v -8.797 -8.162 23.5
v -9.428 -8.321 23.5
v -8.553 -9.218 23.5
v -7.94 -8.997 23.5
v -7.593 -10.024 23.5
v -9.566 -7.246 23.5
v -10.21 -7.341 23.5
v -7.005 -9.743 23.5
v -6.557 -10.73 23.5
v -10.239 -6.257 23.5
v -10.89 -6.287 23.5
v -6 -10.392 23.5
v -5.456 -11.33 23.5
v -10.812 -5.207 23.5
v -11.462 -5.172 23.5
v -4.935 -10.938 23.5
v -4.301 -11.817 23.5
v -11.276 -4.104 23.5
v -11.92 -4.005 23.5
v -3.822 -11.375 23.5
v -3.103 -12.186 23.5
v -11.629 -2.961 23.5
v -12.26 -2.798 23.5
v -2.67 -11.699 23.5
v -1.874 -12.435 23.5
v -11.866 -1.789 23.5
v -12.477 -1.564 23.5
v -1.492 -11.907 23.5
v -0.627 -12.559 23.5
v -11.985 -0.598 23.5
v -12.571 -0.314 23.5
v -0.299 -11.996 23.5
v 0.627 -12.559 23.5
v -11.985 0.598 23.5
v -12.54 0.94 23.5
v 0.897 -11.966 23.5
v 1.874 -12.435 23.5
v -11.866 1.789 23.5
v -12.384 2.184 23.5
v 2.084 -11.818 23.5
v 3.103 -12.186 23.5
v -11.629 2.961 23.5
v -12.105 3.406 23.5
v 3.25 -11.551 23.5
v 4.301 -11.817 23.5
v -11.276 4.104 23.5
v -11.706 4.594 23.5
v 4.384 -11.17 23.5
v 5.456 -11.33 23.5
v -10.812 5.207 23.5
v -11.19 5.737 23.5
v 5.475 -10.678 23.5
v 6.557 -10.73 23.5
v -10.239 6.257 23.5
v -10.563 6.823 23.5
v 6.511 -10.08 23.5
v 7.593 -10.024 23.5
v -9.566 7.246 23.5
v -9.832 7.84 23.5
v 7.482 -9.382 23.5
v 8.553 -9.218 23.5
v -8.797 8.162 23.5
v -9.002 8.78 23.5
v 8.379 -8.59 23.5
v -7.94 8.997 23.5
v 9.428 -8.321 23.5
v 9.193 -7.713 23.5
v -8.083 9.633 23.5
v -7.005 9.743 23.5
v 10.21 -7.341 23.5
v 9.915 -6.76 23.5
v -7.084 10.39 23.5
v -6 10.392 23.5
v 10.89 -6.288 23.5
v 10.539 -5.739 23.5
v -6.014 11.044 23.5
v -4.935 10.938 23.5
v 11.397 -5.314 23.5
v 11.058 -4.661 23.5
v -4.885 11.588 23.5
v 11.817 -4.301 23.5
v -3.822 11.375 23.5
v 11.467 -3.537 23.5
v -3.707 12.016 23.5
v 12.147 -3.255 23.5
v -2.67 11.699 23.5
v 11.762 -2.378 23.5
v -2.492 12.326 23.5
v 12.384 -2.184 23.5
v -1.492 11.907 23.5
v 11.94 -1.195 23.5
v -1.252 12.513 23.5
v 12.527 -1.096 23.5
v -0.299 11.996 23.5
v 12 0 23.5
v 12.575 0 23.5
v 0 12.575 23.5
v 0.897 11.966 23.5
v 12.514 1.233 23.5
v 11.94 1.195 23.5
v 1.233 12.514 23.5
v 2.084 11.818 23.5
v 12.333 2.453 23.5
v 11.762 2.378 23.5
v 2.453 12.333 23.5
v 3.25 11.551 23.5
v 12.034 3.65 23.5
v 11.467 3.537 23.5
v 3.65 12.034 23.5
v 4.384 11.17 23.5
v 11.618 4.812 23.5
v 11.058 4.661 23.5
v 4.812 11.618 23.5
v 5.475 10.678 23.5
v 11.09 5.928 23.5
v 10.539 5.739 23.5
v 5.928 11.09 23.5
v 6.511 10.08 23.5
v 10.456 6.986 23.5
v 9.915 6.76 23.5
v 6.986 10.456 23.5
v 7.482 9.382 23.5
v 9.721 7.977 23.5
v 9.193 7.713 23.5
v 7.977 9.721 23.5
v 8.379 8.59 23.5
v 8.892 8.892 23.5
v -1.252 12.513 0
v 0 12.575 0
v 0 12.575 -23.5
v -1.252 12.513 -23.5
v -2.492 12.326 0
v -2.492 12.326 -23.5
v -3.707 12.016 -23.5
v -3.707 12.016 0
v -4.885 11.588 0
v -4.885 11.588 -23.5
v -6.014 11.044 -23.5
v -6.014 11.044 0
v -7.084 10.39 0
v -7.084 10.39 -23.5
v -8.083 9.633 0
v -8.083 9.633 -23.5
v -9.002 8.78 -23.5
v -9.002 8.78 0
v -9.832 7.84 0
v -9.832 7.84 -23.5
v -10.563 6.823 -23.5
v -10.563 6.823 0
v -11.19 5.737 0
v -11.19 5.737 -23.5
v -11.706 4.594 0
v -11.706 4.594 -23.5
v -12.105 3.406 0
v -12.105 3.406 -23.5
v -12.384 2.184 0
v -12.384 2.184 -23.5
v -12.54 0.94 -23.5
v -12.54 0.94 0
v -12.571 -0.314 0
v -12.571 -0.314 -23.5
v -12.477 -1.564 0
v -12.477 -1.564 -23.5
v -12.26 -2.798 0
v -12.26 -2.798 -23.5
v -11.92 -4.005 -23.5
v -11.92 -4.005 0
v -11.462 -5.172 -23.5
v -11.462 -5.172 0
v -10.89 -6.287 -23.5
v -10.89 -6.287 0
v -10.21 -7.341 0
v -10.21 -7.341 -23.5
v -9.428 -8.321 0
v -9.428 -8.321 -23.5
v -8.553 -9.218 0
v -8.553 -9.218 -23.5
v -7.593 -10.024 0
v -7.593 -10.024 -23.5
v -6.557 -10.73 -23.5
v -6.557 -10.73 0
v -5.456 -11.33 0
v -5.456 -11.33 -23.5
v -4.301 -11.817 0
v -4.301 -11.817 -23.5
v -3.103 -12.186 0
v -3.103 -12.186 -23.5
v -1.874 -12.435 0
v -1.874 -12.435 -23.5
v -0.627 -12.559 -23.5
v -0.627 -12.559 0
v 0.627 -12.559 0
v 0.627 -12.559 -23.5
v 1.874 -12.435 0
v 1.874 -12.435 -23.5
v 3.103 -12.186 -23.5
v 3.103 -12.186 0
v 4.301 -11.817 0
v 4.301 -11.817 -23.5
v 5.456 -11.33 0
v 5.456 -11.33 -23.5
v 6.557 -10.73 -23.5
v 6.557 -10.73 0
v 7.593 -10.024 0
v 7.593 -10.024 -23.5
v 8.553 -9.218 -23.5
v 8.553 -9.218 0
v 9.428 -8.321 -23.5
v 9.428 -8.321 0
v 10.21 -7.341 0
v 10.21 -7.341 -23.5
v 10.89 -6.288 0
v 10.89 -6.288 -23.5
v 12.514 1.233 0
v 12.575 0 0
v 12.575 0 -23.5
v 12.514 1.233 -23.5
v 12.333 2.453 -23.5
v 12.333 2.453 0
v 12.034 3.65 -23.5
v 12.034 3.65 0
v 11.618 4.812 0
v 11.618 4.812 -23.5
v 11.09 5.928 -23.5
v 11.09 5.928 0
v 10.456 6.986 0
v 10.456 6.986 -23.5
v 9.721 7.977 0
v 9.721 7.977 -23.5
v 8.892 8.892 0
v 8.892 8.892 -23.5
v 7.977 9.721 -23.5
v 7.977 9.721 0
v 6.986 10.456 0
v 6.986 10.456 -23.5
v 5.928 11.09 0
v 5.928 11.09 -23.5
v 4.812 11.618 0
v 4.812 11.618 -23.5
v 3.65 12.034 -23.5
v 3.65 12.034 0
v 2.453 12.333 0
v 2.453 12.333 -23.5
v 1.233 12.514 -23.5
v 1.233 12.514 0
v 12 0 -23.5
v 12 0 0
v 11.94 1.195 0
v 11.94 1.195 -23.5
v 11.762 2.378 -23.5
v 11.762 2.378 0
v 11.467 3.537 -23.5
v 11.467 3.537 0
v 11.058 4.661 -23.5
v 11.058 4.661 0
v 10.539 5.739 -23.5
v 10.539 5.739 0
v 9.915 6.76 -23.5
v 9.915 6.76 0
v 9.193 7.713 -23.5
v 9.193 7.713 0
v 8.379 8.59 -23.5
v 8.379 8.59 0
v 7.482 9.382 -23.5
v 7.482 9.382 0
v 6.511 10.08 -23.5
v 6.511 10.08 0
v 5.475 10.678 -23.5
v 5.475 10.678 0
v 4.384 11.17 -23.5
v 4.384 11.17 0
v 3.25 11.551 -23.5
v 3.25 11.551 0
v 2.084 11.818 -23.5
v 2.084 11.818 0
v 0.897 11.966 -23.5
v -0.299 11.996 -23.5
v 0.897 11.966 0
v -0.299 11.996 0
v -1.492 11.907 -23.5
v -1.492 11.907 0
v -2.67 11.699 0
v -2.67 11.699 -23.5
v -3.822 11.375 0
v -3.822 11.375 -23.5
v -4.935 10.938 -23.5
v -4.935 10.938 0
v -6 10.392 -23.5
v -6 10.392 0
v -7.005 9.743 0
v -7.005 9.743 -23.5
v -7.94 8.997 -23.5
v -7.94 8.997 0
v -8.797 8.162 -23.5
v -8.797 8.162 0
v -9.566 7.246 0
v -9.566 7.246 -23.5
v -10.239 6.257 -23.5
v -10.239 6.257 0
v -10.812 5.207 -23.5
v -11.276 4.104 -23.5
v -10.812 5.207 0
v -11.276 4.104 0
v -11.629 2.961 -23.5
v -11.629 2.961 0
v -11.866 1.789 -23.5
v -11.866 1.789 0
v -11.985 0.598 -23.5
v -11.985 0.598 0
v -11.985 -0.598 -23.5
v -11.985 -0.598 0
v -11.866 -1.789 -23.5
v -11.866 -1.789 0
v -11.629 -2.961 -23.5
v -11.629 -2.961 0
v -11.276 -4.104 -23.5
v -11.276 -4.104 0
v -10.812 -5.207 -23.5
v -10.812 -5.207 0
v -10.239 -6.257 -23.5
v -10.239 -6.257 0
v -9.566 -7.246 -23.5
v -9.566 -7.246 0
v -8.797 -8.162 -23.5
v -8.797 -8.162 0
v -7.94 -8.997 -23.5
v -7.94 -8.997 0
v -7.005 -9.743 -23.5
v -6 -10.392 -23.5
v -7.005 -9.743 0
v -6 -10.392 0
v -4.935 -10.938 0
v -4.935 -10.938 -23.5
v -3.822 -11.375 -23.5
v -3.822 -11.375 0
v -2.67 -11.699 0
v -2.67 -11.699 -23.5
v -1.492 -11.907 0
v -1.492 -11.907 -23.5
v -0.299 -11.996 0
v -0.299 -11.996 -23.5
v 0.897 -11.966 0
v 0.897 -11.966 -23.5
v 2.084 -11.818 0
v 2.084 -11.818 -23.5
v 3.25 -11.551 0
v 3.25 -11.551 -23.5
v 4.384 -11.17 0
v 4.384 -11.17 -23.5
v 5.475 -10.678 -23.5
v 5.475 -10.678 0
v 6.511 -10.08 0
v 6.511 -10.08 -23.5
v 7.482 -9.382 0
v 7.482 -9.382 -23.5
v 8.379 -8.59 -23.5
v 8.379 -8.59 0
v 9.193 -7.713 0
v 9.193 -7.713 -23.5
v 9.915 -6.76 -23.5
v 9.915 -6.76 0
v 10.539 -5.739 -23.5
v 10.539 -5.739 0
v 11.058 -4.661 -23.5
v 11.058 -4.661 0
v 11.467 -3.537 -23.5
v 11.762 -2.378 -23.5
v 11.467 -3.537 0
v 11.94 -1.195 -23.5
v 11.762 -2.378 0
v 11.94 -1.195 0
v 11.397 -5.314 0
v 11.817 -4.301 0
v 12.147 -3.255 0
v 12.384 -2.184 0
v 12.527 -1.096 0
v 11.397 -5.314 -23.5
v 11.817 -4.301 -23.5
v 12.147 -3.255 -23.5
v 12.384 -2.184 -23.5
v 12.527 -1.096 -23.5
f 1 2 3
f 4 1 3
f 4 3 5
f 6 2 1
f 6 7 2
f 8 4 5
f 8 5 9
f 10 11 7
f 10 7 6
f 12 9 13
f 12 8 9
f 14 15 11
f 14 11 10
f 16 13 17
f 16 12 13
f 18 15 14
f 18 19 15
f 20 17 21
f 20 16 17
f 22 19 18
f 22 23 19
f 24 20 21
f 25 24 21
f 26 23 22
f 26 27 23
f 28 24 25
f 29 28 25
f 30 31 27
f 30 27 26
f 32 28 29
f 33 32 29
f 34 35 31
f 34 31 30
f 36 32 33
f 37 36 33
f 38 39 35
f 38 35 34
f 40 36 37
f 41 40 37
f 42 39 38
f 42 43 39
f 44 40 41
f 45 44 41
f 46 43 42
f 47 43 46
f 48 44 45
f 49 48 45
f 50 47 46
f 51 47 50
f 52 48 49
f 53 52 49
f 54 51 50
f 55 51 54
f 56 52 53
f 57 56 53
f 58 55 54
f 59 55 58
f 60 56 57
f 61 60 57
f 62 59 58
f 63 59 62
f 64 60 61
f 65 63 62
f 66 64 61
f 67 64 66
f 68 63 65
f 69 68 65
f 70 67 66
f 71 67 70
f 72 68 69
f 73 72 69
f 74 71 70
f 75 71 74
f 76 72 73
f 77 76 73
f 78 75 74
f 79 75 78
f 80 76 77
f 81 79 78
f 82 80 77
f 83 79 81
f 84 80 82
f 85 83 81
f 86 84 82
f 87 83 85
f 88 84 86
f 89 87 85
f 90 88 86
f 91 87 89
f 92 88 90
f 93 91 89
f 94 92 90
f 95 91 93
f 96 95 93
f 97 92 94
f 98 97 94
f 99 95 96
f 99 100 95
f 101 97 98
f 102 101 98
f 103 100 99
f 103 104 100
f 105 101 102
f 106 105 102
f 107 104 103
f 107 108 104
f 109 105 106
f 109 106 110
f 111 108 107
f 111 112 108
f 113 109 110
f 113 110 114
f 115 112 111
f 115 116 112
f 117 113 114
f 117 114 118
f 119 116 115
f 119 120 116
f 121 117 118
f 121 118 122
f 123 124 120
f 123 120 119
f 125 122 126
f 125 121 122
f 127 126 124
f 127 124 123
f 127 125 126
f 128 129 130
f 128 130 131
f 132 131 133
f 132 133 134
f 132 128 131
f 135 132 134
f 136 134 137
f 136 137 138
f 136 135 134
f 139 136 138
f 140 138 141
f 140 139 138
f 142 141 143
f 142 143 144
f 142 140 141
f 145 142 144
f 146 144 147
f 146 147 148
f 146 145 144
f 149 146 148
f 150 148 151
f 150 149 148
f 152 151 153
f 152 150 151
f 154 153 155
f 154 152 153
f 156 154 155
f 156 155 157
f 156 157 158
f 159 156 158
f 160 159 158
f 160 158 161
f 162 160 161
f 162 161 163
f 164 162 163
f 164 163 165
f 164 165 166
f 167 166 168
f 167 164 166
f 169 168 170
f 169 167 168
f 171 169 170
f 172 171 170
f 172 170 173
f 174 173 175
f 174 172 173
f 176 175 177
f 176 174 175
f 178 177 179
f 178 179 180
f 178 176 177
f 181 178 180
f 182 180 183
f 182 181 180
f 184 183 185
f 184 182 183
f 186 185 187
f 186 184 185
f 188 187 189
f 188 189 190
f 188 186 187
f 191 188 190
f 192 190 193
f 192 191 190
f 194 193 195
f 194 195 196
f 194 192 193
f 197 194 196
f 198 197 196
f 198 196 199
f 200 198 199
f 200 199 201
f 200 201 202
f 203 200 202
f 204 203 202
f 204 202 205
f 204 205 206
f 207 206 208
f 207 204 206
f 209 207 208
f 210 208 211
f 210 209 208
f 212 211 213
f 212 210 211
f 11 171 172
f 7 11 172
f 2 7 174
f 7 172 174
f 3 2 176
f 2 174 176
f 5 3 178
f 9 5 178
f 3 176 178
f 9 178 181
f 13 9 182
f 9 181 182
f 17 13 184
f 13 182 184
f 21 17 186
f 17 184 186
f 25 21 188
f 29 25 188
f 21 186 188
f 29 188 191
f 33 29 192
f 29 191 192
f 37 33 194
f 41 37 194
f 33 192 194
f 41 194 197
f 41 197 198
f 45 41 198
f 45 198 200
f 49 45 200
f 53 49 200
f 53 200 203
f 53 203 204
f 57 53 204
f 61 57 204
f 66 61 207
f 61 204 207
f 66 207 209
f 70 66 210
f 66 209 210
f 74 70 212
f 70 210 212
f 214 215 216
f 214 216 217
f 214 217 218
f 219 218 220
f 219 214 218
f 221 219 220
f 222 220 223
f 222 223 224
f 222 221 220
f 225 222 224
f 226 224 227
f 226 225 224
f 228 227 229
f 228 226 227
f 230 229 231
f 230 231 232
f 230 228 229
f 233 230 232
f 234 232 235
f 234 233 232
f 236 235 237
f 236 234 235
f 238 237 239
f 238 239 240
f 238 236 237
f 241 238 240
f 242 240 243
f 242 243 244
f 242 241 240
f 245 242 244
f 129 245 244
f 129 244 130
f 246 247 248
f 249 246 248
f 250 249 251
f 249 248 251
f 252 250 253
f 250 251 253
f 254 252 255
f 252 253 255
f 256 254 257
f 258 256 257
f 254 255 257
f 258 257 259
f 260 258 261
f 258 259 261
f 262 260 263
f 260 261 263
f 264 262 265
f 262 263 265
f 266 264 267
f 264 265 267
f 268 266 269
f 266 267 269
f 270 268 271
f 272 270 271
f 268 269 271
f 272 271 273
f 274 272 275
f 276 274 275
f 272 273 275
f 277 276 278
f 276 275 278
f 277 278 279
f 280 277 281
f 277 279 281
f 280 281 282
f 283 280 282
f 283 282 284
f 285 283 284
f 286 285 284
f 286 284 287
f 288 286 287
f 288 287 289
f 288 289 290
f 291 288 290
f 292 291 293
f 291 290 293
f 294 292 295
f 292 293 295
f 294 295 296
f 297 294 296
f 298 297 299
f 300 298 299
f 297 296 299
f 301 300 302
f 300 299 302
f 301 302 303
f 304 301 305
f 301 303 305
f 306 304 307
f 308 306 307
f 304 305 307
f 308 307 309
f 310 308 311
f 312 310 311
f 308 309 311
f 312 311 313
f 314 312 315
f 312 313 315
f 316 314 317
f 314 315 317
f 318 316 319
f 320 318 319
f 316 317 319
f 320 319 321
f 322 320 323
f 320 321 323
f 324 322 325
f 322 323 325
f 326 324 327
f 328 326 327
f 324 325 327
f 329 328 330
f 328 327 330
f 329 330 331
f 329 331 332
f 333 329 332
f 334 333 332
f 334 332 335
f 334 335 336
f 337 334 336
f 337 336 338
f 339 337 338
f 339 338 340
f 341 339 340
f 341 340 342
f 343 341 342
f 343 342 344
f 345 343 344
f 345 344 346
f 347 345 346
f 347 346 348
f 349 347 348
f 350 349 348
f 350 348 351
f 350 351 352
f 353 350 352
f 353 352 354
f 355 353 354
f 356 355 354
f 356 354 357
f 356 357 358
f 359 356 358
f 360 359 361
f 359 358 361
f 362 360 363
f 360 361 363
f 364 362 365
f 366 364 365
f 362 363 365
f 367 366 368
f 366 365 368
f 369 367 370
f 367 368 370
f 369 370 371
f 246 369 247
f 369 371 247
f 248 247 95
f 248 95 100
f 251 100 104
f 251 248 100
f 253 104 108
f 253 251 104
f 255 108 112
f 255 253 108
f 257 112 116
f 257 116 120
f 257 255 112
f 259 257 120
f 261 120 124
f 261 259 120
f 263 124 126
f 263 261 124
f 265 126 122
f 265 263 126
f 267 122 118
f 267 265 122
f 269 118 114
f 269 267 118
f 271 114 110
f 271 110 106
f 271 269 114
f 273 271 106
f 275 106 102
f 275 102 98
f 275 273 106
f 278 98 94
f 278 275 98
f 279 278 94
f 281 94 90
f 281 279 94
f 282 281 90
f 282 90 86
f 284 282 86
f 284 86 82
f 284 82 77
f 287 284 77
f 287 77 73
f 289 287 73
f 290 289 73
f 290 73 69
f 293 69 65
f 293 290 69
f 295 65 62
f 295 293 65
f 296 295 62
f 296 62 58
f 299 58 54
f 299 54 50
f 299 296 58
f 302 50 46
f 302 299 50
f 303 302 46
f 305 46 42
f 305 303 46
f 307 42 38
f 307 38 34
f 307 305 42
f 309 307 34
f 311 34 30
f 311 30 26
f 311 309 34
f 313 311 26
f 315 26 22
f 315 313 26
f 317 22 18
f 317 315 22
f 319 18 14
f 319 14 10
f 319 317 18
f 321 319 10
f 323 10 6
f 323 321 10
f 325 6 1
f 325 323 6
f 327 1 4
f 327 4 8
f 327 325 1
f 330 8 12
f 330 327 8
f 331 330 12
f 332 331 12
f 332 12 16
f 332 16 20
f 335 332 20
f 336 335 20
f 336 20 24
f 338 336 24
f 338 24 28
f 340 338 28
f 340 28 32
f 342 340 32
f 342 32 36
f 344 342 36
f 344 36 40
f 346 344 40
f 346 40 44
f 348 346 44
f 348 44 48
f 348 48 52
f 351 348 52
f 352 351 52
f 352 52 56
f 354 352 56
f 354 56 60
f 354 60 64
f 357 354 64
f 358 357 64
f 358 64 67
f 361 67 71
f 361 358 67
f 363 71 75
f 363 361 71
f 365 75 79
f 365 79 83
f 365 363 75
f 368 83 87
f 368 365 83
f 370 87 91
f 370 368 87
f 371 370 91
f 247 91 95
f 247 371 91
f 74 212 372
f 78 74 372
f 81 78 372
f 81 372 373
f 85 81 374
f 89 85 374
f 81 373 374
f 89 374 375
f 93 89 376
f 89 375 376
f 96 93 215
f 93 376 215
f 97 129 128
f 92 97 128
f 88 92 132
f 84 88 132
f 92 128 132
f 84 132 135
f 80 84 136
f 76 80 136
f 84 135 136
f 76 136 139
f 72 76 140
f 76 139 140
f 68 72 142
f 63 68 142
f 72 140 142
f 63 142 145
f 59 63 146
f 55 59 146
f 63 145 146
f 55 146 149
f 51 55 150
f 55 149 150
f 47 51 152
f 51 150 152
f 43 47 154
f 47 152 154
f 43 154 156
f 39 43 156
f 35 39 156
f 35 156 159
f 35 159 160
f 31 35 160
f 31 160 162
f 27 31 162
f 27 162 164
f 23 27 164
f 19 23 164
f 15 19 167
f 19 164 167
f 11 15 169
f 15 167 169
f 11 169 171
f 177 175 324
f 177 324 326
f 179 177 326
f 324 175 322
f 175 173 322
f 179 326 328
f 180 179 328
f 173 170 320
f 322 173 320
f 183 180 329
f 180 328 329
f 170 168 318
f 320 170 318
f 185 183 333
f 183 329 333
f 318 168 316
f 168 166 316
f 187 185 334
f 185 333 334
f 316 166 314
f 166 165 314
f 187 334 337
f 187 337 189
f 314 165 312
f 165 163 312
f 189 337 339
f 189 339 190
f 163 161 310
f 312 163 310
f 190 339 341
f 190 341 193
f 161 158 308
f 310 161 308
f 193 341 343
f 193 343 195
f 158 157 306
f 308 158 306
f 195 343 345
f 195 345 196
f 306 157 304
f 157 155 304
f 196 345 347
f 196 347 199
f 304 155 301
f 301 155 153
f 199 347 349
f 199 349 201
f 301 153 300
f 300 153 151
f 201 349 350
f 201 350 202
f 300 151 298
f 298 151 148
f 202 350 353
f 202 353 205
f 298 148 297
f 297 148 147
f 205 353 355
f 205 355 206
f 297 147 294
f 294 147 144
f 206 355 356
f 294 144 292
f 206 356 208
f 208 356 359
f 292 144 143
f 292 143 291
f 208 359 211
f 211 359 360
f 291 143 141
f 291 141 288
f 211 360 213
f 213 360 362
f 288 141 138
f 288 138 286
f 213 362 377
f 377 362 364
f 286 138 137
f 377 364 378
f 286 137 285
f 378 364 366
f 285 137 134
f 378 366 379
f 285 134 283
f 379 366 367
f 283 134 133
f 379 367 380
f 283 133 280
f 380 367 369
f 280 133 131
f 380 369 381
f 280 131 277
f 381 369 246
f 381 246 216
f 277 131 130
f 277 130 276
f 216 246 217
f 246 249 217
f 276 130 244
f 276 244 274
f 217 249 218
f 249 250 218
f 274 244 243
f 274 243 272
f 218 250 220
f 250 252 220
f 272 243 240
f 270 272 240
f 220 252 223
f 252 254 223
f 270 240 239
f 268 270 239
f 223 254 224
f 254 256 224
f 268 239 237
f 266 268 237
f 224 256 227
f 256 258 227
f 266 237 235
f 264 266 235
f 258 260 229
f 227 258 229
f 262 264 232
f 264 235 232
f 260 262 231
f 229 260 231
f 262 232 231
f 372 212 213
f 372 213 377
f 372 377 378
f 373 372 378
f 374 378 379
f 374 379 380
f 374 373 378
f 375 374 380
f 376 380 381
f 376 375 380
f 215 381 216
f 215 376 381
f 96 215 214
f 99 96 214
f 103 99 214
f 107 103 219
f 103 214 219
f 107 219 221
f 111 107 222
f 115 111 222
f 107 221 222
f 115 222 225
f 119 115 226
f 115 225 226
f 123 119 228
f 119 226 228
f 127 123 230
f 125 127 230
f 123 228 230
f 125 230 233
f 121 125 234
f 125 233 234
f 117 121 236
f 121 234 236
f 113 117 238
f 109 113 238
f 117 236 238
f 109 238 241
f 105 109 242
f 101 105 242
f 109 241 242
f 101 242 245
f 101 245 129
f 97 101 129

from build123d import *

# Parameters (mm, degrees)
F0_R     = 12
F1_DEPTH = 23.5


with BuildPart() as f1:
    # F0 (on Top) → F1 (new body, symmetric)
    with BuildSketch(Plane.XY):
        with BuildLine():
            ThreePointArc((10.8902694237, -6.2875000501), (12.1465172581, -3.2546495201), (12.575, 0))
            ThreePointArc((12.575, 0), (8.891867784, 8.8918677628), (2.99e-08, 12.575))
            ThreePointArc((2.99e-08, 12.575), (-10.8902693743, 6.2875001356), (-10.8902695943, -6.2874997546))
            ThreePointArc((-10.8902695943, -6.2874997546), (-1.706e-07, -12.575), (10.8902694237, -6.2875000501))
        make_face()
        Circle(F0_R, mode=Mode.SUBTRACT)
    extrude(amount=F1_DEPTH, both=True)


solid = f1.part
